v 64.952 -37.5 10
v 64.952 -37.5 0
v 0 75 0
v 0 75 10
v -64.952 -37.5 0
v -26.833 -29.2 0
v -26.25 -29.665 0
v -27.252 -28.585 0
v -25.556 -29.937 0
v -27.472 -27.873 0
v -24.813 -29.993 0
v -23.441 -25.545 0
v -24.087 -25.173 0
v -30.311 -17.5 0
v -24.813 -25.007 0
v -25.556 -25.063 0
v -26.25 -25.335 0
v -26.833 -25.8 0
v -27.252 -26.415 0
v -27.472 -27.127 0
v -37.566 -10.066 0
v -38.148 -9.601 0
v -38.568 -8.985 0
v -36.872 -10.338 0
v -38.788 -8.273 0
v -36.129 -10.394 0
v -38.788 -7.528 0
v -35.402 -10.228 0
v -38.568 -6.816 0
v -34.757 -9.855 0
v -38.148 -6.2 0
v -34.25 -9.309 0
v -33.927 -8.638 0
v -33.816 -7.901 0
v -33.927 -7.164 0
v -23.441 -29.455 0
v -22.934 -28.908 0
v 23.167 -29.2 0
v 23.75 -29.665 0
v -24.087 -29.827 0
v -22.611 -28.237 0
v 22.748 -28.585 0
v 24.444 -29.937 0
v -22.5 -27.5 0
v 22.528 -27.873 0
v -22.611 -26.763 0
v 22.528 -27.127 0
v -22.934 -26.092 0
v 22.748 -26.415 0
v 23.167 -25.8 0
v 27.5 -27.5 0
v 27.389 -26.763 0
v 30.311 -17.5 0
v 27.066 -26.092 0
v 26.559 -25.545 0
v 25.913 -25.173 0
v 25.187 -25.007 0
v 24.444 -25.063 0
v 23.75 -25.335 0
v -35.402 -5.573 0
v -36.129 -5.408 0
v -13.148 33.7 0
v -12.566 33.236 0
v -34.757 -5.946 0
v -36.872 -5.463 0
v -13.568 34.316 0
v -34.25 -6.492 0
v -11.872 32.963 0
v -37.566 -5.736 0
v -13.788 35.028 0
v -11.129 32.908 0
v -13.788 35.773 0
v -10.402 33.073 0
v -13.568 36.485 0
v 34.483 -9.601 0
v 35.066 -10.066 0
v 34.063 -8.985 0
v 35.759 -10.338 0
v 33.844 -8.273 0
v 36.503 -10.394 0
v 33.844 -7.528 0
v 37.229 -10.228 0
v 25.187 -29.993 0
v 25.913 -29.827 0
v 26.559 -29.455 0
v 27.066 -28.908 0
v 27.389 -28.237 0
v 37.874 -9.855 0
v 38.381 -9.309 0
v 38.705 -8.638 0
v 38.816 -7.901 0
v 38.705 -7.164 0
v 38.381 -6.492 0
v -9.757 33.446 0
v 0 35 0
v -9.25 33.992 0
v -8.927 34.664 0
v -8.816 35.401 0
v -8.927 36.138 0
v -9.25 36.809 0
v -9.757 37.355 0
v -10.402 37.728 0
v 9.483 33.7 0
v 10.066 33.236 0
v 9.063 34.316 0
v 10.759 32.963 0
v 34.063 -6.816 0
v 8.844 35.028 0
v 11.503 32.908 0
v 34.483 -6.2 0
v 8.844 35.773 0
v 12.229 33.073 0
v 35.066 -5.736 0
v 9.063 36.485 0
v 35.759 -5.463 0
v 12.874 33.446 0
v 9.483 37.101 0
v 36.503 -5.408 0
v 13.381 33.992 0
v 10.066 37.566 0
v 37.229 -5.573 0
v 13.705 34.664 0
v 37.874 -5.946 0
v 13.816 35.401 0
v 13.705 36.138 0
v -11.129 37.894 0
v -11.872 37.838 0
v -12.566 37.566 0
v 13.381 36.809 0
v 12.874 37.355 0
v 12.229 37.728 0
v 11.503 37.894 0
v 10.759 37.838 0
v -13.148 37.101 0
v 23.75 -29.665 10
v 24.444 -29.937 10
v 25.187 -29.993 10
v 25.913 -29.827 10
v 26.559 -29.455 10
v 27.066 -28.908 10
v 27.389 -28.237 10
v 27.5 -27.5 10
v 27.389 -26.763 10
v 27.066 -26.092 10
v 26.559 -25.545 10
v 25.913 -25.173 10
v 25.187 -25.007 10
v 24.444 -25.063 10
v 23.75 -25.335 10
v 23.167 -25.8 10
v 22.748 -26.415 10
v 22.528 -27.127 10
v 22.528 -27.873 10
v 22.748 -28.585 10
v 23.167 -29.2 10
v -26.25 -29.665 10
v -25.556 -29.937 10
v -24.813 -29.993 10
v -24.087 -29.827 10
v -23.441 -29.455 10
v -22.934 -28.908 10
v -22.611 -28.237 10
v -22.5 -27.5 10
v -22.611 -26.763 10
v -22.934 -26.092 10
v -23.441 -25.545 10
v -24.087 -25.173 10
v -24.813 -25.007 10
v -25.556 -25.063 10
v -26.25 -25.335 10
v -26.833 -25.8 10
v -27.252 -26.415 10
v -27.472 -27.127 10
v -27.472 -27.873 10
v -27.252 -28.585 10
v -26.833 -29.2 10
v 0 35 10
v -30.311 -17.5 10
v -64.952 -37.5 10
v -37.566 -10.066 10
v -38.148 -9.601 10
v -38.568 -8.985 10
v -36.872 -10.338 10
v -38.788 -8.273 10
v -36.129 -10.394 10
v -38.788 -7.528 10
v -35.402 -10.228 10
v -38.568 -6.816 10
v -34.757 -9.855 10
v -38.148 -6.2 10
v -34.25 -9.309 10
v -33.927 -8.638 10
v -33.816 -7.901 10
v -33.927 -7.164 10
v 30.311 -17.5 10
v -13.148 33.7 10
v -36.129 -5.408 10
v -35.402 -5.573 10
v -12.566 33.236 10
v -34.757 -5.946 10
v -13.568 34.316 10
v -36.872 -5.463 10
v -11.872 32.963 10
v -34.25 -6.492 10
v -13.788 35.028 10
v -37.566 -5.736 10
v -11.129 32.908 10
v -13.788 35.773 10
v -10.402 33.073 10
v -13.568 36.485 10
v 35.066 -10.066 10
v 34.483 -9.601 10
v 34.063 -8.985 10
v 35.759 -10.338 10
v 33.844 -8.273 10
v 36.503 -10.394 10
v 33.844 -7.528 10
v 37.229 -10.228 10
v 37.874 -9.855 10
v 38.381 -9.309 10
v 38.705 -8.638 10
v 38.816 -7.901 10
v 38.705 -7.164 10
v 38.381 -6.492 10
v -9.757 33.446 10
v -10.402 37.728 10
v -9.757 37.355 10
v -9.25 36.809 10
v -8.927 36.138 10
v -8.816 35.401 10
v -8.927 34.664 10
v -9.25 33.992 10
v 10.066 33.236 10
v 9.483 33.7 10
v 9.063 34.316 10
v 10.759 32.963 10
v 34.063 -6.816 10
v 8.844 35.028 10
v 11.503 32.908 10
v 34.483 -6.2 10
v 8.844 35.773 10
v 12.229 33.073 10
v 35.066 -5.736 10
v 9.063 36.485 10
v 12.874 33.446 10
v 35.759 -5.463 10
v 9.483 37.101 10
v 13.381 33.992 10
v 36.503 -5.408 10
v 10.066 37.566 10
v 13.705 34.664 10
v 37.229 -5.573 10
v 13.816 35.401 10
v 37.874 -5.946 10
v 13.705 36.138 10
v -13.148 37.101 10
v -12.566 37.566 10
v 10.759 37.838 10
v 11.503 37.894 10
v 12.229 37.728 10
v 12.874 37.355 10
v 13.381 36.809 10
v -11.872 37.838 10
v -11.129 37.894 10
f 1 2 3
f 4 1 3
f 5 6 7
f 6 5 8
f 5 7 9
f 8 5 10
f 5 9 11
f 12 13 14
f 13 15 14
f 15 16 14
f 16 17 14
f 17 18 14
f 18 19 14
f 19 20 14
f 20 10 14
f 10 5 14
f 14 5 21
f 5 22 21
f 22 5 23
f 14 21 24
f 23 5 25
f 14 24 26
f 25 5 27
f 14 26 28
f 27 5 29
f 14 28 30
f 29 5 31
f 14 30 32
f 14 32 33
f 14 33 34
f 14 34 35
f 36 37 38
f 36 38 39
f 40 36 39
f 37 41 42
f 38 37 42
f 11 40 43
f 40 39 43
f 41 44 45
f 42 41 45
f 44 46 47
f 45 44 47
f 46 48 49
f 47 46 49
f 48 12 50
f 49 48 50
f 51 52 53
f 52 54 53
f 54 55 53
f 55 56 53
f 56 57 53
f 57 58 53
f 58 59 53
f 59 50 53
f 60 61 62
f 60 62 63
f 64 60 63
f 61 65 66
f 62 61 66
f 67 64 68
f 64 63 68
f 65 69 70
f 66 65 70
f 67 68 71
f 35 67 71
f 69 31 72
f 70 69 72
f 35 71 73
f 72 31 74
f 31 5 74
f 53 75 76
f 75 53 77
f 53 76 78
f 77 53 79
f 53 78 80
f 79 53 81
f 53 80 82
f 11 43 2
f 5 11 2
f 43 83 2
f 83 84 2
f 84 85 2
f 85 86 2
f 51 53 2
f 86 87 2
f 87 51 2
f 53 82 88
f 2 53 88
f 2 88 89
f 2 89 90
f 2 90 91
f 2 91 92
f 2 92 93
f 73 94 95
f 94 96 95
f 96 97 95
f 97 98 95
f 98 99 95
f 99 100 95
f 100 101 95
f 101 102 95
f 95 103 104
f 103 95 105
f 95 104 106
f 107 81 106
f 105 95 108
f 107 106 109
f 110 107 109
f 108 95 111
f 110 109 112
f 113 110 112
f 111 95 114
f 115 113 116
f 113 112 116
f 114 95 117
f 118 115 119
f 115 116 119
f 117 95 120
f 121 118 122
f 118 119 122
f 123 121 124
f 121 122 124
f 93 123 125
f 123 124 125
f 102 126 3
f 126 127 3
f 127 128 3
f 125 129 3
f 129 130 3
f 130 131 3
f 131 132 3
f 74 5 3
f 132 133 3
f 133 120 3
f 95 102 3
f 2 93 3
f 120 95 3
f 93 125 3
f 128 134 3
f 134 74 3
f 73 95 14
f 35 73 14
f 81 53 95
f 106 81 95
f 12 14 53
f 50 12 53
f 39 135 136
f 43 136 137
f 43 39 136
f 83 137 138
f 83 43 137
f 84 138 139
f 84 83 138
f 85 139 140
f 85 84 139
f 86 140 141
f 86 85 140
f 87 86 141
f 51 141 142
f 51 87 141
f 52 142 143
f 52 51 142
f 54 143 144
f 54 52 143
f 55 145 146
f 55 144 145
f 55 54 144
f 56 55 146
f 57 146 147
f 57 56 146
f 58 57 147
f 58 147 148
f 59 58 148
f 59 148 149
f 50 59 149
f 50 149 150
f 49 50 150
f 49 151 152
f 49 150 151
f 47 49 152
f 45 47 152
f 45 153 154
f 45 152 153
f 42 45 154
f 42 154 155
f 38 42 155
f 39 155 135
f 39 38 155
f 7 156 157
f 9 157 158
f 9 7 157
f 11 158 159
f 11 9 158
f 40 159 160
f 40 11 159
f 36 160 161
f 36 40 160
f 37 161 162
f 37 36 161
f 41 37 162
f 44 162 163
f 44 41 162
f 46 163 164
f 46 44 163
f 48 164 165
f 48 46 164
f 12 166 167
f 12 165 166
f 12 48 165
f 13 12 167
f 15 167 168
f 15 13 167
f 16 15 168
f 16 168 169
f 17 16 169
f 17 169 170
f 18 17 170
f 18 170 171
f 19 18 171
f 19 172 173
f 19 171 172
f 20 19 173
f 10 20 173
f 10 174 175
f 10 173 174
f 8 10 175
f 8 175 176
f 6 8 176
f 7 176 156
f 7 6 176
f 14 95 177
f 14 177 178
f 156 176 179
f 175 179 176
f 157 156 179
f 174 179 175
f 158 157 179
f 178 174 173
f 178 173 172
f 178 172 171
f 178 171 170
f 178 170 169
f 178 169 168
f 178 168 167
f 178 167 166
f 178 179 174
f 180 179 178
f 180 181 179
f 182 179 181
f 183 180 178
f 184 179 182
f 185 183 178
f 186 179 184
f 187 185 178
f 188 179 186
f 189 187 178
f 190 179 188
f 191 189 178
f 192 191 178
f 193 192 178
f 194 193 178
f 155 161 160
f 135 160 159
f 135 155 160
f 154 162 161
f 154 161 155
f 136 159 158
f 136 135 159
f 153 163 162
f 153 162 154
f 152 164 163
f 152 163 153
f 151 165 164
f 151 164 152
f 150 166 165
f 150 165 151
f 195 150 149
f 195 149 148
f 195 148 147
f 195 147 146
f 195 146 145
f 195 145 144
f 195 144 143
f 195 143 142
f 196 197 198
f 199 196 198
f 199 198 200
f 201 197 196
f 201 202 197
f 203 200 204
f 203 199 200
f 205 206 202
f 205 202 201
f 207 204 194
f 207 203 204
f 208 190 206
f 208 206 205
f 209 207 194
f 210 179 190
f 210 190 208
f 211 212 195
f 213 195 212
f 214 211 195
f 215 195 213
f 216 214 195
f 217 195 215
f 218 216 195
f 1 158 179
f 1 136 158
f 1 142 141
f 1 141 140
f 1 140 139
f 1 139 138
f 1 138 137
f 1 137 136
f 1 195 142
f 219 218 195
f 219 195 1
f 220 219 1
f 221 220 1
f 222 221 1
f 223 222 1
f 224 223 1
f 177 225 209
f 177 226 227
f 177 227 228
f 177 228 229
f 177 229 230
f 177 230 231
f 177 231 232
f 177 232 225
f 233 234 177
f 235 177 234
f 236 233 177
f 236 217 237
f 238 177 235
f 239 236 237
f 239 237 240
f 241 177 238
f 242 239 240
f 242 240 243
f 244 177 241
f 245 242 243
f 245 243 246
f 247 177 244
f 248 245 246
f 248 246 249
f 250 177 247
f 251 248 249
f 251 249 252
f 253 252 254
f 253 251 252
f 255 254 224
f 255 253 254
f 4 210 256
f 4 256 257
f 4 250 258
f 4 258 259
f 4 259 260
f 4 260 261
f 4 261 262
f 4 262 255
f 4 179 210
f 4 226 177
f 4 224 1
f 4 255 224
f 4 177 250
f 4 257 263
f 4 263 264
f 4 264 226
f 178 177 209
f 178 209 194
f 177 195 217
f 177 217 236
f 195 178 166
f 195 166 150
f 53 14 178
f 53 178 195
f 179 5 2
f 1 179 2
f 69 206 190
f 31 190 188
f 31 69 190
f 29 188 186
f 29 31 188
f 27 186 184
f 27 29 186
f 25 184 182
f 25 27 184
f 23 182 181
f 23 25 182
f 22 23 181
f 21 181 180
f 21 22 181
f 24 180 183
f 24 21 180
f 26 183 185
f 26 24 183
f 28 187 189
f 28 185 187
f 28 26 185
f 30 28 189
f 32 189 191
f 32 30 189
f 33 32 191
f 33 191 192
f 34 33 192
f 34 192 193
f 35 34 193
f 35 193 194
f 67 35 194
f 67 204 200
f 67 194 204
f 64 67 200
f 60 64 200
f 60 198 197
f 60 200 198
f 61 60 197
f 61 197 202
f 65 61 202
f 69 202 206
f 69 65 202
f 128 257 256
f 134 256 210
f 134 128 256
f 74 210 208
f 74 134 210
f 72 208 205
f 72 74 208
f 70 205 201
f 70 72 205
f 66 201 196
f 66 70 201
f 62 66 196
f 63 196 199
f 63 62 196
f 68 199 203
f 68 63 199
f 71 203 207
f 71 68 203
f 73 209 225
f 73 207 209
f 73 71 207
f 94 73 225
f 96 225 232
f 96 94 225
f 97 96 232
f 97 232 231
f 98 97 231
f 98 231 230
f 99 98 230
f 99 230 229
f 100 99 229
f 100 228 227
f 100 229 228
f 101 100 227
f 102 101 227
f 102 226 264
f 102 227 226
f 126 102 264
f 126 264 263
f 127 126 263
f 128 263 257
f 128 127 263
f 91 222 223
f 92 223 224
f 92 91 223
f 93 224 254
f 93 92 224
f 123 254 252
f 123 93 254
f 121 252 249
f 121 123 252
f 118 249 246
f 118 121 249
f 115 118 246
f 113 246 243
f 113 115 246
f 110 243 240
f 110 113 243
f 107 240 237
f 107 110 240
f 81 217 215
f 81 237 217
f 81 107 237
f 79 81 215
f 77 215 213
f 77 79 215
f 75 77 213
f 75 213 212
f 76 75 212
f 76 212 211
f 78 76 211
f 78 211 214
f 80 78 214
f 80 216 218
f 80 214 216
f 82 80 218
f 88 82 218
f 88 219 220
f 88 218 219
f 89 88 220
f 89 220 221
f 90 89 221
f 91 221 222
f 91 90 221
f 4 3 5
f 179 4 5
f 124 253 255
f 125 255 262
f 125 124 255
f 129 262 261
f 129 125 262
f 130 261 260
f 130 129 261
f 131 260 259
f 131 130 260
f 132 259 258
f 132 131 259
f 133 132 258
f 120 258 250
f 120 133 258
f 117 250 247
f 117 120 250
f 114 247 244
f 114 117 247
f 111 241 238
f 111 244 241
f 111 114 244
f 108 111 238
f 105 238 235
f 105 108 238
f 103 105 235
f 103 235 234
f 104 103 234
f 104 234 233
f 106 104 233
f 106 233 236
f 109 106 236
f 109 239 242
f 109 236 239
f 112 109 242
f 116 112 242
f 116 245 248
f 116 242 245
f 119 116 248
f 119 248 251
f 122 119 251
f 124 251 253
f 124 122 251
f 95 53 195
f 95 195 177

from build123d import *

# Parameters (mm, degrees)
PAD007_DEPTH       = 10
SKETCH012_R        = 2.5
POCKET003_DEPTH    = 354.275599702
POLARPATTERN_COUNT = 3


with BuildPart() as part:
    # Sketch011 → Pad007 (new body)
    with BuildSketch(Plane.XY):
        Polygon((0, 75), (-64.9519052838, -37.5), (64.9519052838, -37.5), align=None)
        Polygon((0, 35), (-30.3108891325, -17.5), (30.3108891325, -17.5), align=None, mode=Mode.SUBTRACT)
    extrude(amount=PAD007_DEPTH)

    # Sketch012 → Pocket003 (cut, through all)
    with BuildSketch(Plane.XY):
        with Locations((11.3156986041, 35.4006350946)):
            Circle(SKETCH012_R)
        with Locations((36.3156986041, -7.9006350946)):
            Circle(SKETCH012_R)
    pocket003 = extrude(amount=POCKET003_DEPTH, mode=Mode.SUBTRACT)

    # PolarPattern: Pocket003 ×3 about axis
    polarpattern_axis = Axis((0, 0, 0), (0, 0, 1))
    for i in range(1, POLARPATTERN_COUNT):
        add(pocket003.rotate(polarpattern_axis, i * 360 / POLARPATTERN_COUNT), mode=Mode.SUBTRACT)


solid = part.part
